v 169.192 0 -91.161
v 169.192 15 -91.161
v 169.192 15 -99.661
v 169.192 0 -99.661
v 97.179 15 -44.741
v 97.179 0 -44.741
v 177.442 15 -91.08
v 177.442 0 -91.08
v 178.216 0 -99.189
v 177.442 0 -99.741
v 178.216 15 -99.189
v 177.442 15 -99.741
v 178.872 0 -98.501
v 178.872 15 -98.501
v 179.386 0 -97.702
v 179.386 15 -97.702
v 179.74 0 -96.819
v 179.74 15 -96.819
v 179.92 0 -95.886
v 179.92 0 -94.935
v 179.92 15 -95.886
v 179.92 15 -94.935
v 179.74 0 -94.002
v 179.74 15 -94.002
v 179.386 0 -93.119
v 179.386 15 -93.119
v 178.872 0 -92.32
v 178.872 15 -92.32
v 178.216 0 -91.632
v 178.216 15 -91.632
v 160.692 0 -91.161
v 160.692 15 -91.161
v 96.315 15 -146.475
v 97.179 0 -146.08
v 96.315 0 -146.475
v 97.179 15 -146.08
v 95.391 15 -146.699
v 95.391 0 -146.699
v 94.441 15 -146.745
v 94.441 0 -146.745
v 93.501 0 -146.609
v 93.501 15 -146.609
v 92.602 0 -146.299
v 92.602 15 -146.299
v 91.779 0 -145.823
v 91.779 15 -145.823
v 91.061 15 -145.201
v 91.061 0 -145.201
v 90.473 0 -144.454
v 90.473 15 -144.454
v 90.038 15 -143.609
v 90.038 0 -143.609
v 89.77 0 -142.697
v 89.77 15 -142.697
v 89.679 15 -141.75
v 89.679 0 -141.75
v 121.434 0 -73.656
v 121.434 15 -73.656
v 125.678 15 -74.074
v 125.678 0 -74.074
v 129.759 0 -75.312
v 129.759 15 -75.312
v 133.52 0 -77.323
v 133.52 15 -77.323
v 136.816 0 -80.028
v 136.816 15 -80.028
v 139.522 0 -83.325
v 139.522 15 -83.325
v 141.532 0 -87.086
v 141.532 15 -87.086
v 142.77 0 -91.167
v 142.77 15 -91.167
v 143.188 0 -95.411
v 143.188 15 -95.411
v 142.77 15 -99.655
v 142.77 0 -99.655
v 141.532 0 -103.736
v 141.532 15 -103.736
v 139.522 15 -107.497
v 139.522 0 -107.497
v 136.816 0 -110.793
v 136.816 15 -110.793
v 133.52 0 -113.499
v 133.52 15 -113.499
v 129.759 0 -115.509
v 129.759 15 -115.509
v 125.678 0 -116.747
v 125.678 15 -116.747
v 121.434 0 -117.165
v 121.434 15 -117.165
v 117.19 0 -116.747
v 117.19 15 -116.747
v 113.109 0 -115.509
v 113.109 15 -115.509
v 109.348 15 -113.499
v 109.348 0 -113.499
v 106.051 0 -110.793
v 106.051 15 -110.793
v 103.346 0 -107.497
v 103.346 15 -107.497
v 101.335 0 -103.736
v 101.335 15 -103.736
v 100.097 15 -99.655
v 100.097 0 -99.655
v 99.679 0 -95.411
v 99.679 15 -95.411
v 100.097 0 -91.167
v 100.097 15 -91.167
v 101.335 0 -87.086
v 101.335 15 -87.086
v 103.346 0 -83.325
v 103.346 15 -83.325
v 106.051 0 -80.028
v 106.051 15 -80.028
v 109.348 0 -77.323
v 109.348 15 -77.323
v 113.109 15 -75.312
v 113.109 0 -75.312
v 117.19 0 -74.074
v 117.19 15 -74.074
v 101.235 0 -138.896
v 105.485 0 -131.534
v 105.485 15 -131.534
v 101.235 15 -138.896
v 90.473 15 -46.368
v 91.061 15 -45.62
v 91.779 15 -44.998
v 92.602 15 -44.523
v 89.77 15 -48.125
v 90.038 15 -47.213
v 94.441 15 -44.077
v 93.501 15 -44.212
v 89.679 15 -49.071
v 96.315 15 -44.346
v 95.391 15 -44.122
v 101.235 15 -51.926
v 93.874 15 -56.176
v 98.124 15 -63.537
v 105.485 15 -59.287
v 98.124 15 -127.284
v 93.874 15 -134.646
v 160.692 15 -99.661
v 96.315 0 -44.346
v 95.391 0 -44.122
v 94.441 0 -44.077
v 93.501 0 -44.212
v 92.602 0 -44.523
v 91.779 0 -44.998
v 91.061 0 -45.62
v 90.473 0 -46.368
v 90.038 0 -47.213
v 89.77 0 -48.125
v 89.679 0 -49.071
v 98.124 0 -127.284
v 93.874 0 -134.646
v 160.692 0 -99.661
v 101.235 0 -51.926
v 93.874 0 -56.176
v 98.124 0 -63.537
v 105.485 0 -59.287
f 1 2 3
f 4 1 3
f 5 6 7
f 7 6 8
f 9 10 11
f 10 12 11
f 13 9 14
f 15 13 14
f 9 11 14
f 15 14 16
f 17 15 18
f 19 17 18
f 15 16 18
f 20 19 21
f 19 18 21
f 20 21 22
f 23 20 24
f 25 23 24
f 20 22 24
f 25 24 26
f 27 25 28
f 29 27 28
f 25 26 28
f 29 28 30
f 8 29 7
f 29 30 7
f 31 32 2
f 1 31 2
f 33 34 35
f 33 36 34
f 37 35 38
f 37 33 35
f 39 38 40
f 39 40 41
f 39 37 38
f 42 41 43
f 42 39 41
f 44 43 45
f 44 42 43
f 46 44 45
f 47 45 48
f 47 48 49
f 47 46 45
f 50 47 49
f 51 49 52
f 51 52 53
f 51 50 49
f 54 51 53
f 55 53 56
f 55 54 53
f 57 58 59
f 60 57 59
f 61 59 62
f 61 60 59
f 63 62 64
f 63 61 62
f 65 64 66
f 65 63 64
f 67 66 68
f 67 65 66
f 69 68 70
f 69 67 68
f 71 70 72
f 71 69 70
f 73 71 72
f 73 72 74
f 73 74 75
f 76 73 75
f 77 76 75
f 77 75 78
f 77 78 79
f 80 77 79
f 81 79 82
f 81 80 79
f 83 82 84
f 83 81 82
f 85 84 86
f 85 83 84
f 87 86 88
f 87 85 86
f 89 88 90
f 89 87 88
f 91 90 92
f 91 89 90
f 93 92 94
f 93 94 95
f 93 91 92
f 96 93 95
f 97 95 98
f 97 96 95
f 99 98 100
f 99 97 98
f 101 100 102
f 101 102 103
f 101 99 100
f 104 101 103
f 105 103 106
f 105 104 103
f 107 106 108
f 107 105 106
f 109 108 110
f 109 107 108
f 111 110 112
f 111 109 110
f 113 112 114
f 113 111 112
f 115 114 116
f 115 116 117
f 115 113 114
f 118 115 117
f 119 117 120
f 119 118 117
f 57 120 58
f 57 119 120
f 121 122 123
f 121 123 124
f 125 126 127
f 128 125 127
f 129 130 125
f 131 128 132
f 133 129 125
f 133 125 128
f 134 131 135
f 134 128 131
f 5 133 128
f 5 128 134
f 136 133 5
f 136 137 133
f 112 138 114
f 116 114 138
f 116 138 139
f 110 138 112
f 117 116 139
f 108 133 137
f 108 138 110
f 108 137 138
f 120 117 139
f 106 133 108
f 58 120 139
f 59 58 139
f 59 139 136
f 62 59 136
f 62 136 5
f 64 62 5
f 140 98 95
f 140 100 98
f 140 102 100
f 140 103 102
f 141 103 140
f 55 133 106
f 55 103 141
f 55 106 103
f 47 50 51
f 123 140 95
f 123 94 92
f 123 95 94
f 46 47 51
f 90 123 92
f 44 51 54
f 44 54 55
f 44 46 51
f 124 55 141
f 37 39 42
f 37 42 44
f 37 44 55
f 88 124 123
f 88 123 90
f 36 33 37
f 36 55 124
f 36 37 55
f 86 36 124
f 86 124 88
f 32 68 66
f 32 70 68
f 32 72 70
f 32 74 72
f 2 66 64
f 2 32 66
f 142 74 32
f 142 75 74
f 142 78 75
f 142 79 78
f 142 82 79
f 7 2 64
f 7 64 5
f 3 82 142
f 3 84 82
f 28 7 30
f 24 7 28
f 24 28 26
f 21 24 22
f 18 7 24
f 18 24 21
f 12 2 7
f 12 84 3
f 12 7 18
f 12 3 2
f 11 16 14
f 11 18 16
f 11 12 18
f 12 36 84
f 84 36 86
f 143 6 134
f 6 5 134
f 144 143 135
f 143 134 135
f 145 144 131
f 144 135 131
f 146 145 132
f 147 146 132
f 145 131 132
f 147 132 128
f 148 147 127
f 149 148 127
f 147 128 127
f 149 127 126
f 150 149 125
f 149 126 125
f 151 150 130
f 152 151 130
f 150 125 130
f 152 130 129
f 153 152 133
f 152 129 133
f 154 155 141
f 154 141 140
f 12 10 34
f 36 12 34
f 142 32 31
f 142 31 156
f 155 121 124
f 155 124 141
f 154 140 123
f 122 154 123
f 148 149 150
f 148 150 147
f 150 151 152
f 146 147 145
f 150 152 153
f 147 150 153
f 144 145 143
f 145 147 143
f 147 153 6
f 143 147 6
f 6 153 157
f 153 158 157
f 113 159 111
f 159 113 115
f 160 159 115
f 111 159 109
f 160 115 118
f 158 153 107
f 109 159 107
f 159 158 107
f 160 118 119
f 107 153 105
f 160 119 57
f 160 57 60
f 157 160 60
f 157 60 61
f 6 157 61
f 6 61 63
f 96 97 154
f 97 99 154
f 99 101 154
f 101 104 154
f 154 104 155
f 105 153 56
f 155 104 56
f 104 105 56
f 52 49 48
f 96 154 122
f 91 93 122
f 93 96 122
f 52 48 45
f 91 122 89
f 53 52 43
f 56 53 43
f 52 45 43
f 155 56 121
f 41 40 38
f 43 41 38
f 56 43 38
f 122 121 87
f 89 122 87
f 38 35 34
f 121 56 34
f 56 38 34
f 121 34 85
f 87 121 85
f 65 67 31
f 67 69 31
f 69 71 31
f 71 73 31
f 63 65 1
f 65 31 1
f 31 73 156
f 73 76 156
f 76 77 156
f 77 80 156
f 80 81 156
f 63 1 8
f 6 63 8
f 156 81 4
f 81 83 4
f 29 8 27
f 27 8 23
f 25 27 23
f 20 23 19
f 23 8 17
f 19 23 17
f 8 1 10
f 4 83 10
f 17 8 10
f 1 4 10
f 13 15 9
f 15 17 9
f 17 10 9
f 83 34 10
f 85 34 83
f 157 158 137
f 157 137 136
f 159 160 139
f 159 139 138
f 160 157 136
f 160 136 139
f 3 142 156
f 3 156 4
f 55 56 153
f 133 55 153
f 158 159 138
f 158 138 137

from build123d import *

# Parameters (mm, degrees)
SKETCH2_R           = 21.754264805
SKETCH2_W           = 8.5
SKETCH2_H           = 8.5
BOSS_EXTRUDE2_DEPTH = 15
FILLET2_R           = 5


with BuildPart() as part:
    # Sketch2 → Boss-Extrude2 (new body)
    with BuildSketch(Plane(origin=(0, 0, 0), x_dir=(1, 0, 0), z_dir=(0, 1, 0))):
        Polygon((184.942144259, 95.410610484), (89.679349842, 150.410610484), (89.679349842, 40.410610484), align=None)
        with Locations(Location((121.433614648, 95.410610484, 0), (0, 0, 270))):
            Circle(SKETCH2_R, mode=Mode.SUBTRACT)
        Polygon((105.484957808, 59.286726526), (98.123741876, 63.536726526), (93.873741876, 56.175510594), (101.234957808, 51.925510594), align=None, mode=Mode.SUBTRACT)
        with Locations((164.942144259, 95.410610484)):
            Rectangle(SKETCH2_W, SKETCH2_H, mode=Mode.SUBTRACT)
        Polygon((105.484957808, 131.534494442), (101.234957808, 138.895710374), (93.873741876, 134.645710374), (98.123741876, 127.284494442), align=None, mode=Mode.SUBTRACT)
    extrude(amount=BOSS_EXTRUDE2_DEPTH)

    # Fillet2
    fillet2_edges = [part.edges().sort_by_distance(p)[0] for p in [
        (89.679349842, 7.5, -40.410610484),
        (89.679349842, 7.5, -150.410610484),
        (184.942144259, 7.5, -95.410610484),
    ]]
    fillet(fillet2_edges, radius=FILLET2_R)


solid = part.part
